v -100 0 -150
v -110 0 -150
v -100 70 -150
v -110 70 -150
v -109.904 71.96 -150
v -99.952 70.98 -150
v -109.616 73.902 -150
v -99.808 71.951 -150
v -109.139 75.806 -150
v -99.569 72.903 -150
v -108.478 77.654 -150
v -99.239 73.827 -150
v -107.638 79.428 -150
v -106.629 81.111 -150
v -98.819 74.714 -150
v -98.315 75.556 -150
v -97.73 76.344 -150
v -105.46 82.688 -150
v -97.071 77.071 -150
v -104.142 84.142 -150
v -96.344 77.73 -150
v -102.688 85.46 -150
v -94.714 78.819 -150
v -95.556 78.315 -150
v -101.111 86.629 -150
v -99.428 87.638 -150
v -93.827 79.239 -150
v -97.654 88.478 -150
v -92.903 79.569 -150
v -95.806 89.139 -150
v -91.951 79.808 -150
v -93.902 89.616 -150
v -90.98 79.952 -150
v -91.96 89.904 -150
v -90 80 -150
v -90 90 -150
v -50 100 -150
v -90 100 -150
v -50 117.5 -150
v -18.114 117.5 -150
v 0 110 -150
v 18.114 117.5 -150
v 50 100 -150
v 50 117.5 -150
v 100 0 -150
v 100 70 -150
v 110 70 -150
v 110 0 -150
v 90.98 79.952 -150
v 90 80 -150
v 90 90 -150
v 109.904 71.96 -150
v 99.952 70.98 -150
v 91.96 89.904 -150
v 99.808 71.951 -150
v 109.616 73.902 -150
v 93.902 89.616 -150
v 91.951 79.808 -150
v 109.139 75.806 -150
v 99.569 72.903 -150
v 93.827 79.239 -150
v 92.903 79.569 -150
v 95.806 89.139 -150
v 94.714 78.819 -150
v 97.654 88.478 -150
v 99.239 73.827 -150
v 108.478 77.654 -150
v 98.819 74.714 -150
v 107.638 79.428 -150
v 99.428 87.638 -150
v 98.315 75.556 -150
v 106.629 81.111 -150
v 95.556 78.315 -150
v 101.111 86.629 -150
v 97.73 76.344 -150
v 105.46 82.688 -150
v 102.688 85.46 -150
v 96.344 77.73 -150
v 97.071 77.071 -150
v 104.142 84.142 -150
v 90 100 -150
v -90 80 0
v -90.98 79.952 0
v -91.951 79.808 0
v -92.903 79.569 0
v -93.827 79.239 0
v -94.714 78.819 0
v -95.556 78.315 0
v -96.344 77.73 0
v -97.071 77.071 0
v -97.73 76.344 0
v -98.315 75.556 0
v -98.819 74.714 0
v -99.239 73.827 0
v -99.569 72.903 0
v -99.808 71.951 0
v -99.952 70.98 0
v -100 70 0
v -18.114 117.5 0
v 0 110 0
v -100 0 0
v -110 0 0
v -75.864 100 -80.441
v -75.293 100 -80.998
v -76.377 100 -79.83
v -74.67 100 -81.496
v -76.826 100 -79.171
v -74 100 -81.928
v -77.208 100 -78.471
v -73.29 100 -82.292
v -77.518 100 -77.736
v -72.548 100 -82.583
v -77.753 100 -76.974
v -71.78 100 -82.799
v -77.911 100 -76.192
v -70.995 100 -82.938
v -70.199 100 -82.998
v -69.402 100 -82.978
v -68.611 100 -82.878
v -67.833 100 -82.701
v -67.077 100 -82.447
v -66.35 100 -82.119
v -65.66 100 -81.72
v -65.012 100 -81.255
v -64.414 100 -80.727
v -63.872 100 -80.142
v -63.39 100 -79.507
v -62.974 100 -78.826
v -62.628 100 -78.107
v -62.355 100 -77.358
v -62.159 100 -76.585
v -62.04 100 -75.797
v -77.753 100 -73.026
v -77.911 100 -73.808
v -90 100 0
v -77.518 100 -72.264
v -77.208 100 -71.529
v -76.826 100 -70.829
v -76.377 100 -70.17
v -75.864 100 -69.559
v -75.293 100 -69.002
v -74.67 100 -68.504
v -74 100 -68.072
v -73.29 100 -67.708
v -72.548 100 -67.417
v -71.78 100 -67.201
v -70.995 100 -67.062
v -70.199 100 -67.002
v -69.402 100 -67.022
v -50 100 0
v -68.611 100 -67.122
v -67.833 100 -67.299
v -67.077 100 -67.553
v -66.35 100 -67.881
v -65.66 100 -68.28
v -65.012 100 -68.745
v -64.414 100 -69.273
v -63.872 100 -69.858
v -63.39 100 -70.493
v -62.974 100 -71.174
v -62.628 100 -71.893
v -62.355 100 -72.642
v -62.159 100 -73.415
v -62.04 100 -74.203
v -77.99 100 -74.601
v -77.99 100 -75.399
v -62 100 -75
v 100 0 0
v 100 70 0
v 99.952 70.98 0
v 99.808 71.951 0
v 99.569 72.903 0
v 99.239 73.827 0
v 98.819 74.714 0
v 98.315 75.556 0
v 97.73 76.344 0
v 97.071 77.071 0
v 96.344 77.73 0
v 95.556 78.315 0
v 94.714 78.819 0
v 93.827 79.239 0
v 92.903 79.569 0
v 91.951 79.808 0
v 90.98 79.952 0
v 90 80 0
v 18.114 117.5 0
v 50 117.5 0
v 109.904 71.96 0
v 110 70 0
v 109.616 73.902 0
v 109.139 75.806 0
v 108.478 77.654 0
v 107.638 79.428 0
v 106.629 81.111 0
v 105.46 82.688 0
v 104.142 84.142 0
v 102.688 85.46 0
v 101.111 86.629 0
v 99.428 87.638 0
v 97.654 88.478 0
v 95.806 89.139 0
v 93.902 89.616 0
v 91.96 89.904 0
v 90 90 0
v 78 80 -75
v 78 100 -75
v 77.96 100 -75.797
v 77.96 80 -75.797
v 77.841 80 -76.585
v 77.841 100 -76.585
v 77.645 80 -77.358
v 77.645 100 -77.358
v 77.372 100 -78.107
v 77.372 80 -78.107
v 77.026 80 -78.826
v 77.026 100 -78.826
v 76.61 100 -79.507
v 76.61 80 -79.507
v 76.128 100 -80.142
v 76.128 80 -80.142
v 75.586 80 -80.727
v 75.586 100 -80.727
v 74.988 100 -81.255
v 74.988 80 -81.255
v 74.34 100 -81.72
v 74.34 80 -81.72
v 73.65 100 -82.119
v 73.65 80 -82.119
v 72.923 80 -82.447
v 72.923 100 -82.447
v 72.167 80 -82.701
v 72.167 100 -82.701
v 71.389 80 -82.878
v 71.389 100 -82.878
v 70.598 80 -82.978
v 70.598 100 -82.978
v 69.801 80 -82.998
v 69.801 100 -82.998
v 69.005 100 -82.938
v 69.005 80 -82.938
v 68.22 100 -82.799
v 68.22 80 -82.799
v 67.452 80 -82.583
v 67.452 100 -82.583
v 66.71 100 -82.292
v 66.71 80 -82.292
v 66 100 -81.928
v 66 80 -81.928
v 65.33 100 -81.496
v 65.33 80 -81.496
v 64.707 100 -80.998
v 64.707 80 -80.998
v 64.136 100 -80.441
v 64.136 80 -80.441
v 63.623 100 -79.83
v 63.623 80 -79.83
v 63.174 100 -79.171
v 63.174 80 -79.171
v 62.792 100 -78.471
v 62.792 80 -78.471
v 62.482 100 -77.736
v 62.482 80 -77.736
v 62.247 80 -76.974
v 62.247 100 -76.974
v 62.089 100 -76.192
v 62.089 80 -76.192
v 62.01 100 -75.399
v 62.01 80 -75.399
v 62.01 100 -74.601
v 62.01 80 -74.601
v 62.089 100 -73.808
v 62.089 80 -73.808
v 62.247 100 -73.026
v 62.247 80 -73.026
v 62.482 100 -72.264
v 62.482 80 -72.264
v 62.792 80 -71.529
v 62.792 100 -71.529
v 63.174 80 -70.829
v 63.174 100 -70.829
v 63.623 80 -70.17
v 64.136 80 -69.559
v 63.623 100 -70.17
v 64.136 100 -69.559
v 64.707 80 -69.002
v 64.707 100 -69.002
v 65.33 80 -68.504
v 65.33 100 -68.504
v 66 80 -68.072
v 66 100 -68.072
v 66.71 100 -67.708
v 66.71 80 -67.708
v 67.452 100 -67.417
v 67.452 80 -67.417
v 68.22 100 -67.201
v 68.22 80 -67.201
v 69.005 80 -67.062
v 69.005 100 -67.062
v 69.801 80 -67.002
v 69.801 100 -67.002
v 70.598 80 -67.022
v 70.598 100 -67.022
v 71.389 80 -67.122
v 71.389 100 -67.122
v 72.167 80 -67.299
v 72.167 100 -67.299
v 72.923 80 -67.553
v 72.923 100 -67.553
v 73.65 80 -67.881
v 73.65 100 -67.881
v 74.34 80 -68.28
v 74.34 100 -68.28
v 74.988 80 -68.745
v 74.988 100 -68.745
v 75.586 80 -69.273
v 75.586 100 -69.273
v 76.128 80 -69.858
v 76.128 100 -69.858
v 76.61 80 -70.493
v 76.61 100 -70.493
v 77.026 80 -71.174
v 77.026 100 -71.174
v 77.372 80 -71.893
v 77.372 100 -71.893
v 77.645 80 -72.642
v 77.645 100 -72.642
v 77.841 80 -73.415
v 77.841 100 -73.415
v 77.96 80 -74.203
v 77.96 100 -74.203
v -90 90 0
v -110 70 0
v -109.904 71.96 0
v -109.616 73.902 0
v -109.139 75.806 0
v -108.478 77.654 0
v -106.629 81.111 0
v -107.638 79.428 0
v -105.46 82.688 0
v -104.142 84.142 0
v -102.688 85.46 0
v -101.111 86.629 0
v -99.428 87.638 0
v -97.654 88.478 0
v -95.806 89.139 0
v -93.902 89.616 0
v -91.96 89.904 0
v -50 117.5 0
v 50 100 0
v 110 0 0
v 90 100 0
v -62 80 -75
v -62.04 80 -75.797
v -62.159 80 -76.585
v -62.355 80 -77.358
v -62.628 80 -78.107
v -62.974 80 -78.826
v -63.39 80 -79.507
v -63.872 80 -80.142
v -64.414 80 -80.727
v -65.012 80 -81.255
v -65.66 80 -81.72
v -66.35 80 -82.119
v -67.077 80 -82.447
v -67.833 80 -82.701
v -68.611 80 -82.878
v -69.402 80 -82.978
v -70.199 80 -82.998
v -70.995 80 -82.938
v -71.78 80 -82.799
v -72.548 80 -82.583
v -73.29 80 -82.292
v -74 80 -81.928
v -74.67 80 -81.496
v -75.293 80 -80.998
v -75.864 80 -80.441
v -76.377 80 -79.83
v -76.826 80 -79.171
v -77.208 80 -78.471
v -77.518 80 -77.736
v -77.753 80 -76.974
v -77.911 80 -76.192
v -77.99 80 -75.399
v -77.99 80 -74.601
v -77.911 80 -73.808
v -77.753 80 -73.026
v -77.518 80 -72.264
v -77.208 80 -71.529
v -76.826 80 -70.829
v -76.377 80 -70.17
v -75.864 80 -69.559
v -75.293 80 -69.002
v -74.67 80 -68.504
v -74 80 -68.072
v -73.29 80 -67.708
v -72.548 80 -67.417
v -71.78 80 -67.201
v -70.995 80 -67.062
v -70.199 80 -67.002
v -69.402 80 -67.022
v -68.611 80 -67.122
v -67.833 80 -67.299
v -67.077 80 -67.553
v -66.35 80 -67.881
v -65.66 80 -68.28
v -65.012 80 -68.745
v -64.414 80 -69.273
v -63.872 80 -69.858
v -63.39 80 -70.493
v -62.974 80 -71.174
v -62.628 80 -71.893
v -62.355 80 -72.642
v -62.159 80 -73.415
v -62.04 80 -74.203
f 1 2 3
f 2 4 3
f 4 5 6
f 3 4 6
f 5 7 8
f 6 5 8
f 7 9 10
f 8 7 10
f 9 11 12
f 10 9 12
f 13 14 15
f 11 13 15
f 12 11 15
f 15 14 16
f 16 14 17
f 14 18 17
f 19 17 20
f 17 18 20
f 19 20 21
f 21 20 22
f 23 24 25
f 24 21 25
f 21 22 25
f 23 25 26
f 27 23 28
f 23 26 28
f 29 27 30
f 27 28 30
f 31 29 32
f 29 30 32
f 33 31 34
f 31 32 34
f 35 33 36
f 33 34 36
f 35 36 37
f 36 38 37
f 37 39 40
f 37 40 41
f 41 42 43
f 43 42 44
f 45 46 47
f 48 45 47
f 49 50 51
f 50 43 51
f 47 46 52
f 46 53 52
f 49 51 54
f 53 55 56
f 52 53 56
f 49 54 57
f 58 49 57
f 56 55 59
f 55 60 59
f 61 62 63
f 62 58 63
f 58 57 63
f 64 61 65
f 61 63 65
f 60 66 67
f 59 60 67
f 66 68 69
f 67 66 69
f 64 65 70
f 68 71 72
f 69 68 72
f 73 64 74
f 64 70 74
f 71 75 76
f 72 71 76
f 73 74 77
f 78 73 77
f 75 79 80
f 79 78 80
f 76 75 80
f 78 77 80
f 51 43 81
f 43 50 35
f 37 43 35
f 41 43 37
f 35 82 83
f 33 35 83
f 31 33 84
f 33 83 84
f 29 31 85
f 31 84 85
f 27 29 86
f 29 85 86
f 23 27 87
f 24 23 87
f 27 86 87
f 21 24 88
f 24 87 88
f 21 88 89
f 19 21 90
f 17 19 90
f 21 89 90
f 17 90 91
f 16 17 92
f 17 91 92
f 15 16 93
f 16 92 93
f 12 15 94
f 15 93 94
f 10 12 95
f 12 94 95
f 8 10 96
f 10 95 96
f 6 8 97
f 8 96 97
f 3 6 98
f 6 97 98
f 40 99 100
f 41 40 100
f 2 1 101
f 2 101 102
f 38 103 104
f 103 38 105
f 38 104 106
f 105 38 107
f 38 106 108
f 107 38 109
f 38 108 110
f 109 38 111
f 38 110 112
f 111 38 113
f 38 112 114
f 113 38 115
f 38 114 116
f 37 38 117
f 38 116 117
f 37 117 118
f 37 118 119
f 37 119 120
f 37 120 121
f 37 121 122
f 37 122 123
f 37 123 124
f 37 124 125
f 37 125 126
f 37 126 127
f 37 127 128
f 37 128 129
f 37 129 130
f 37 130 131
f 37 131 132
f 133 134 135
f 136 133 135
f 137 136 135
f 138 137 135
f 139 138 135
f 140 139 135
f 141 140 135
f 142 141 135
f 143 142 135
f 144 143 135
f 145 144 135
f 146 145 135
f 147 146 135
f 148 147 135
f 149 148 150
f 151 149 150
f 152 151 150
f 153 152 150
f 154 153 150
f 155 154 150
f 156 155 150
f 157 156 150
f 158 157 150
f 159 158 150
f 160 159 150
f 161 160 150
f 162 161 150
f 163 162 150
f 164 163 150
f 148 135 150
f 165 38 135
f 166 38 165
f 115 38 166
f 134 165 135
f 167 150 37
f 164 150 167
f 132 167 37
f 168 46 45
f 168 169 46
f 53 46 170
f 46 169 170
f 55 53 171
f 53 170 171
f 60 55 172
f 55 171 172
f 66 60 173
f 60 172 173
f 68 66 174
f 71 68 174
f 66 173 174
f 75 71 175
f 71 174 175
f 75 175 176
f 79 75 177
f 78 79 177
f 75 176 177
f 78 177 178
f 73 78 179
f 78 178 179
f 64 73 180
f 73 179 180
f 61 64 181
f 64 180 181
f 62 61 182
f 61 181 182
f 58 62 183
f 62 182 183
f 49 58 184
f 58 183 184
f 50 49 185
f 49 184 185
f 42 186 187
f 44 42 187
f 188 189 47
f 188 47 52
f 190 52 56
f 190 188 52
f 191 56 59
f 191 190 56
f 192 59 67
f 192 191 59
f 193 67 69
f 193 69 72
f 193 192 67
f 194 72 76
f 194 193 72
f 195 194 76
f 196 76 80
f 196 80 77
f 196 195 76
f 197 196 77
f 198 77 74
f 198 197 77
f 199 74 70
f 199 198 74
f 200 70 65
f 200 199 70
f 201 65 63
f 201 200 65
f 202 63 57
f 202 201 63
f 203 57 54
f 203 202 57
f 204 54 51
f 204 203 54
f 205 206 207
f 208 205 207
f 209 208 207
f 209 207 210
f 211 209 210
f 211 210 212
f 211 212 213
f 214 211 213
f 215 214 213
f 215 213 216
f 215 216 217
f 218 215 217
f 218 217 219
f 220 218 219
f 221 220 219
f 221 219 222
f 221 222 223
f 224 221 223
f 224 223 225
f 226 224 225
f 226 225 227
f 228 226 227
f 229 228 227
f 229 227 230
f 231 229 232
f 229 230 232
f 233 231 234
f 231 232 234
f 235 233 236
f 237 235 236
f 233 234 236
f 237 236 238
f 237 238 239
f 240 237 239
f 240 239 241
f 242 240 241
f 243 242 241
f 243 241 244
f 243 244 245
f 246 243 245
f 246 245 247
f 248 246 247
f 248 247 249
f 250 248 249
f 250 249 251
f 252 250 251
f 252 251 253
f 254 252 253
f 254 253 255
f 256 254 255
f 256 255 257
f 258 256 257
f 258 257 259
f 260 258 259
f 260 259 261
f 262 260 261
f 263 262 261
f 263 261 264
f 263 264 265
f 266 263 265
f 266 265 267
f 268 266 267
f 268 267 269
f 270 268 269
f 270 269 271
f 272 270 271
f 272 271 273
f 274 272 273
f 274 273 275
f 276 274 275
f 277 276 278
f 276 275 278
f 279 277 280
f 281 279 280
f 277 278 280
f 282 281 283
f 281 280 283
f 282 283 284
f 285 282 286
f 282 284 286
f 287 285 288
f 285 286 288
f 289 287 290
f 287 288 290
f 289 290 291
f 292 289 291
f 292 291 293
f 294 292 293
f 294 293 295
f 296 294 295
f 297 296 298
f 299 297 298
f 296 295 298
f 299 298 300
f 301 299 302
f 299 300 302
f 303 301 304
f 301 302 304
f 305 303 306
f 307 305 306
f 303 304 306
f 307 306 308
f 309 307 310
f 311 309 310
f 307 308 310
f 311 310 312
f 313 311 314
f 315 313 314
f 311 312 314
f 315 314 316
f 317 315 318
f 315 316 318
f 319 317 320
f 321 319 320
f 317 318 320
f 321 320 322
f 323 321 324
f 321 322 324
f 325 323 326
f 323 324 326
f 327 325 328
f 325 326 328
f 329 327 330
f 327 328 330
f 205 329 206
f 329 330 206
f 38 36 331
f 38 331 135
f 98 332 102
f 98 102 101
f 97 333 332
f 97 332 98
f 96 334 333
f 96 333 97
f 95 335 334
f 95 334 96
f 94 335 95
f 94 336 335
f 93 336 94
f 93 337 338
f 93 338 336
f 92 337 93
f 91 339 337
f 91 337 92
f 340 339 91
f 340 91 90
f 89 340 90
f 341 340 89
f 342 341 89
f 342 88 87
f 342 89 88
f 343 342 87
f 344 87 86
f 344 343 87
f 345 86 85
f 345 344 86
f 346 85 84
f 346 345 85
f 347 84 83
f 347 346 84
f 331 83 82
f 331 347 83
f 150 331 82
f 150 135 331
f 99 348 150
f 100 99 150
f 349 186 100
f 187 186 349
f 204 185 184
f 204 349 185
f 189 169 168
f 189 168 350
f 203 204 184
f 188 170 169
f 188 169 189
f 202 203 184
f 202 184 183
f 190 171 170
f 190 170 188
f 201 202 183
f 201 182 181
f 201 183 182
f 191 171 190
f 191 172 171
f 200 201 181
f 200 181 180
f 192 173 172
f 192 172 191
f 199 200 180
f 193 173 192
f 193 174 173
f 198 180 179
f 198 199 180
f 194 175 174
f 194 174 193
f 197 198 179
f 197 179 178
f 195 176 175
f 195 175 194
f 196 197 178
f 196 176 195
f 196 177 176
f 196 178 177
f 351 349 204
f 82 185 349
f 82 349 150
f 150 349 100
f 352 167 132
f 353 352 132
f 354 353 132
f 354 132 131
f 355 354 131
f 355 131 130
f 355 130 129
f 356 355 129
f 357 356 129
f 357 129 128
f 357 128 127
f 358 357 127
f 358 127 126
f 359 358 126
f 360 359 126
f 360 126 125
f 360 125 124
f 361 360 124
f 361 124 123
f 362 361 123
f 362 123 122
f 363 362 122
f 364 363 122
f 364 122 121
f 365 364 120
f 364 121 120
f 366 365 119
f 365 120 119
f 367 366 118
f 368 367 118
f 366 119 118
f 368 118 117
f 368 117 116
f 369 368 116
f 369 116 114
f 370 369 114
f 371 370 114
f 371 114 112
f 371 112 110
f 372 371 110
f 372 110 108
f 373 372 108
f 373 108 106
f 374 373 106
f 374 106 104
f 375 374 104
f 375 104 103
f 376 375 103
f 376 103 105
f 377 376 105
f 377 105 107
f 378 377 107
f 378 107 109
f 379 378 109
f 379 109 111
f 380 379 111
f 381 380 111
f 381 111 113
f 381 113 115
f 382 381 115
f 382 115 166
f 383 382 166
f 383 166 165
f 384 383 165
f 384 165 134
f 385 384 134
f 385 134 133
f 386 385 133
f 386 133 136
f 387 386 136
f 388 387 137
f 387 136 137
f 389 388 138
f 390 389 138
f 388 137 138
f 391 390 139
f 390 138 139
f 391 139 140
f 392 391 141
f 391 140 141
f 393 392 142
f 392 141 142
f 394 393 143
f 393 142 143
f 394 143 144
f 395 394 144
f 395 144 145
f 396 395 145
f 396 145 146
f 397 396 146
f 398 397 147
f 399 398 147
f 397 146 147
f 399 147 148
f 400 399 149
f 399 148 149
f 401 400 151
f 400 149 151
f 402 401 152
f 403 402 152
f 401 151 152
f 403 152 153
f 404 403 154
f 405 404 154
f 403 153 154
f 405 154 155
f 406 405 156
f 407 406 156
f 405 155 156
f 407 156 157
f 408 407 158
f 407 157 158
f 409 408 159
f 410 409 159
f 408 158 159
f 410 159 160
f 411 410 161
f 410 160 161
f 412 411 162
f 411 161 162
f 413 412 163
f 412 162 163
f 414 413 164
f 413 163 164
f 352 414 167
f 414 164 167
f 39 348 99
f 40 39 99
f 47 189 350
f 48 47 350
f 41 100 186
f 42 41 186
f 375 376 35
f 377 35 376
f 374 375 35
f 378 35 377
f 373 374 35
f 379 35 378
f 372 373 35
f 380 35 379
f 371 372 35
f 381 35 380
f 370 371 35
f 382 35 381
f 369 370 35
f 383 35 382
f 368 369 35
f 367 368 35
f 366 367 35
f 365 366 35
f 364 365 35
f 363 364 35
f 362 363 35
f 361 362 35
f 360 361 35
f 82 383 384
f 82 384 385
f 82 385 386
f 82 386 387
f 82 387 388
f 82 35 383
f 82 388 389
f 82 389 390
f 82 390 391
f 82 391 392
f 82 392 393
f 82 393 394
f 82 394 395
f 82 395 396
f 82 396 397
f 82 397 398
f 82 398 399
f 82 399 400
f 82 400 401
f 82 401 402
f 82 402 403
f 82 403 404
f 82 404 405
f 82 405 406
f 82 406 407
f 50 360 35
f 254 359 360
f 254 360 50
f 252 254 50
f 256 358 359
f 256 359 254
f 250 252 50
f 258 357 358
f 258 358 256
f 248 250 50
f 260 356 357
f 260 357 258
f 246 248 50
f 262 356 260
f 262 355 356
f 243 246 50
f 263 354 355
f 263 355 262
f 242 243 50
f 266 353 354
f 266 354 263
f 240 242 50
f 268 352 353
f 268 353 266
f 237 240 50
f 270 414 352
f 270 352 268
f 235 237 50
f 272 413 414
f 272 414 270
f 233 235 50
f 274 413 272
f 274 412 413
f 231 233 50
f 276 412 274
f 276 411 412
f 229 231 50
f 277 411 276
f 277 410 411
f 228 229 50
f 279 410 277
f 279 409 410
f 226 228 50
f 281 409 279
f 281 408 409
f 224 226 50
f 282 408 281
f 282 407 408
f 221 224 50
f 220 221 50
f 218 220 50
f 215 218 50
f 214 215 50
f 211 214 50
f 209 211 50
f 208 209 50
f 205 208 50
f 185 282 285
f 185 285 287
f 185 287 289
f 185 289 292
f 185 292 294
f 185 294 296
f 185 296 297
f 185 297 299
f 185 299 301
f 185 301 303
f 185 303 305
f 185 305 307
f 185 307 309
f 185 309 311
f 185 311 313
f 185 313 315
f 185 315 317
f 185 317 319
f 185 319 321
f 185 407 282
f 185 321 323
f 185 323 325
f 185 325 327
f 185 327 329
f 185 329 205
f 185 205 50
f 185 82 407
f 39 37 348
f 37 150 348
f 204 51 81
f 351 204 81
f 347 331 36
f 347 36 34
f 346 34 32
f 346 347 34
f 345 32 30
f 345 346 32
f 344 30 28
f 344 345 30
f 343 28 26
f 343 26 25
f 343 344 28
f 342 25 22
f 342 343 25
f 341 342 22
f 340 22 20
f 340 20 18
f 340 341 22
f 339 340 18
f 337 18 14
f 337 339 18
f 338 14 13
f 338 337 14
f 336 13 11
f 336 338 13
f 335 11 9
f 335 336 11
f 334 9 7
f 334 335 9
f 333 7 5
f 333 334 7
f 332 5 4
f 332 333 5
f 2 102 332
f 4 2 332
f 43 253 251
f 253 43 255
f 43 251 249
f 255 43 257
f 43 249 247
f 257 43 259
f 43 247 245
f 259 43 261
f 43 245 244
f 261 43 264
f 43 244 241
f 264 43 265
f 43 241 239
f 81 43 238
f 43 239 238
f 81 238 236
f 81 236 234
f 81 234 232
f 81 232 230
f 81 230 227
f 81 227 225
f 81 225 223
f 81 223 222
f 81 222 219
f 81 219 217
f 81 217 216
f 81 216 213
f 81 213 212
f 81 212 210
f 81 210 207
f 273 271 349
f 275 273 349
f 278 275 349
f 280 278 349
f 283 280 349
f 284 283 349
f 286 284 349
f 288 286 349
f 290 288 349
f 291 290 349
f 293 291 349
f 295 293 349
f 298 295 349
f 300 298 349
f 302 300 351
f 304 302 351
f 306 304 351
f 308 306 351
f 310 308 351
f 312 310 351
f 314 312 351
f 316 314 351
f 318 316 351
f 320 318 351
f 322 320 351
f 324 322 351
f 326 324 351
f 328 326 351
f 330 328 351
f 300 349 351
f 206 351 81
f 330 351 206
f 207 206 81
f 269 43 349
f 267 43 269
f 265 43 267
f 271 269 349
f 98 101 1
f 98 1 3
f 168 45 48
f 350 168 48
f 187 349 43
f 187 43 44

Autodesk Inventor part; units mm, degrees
ref_plane "YZ Plane" through (0, 0, 0) normal (1, 0, 0) x (0, 1, 0)
ref_plane "XZ Plane" through (0, 0, 0) normal (0, 1, 0) x (-1, 0, 0)
ref_plane "XY Plane" through (0, 0, 0) normal (0, 0, 1) x (1, 0, 0)
sketch "Sketch1" plane through (0, 0, 0) normal (0, 0, 1) x (1, 0, 0)
  line L0 (-100, 0) -> (-100, 70)
  line L1 (-90, 80) -> (90, 80)
  line L2 (100, 70) -> (100, 0)
  arc A0 (-90, 80) -> (-100, 70) centre (-90, 70) ccw
  arc A1 (100, 70) -> (90, 80) centre (90, 70) ccw
  line L3 (-110, 0) -> (-110, 70)
  arc A2 (-90, 90) -> (-110, 70) centre (-90, 70) ccw
  arc A3 (110, 70) -> (90, 90) centre (90, 70) ccw
  line L4 (110, 70) -> (110, 0)
  line L5 (100, 0) -> (110, 0)
  line L6 (-100, 0) -> (-110, 0)
  line L7 (-90, 90) -> (-90, 100)
  line L8 (90, 90) -> (90, 100)
  line L9 (-50, 100) -> (-50, 117.5)
  line L10 (50, 100) -> (50, 117.5)
  line L11 (-18.114, 117.5) -> (0, 110)
  line L12 (0, 110) -> (18.114, 117.5)
  line L13 (-50, 117.5) -> (-18.114, 117.5)
  line L14 (18.114, 117.5) -> (50, 117.5)
  line L15 (-90, 100) -> (-50, 100)
  line L16 (50, 100) -> (90, 100)
  point P0 (0, 0)
  dimension "d0" = 100
  dimension "d1" = 100
  dimension "d2" = 80
  dimension "d4" = 10
  dimension "d5" = 10
  dimension "d24" = 10
  dimension "d25" = 50
  dimension "d26" = 50
  dimension "d31" = 31.886
  dimension "d33" = 50
  dimension "d37" = 10
  dimension "d38" = 20
  dimension "d39" = 20
  dimension "d40" = 17.5
  dimension "d41" = 17.5
extrude "Extrusion1" add sketch "Sketch1" against normal blind 150
sketch "Sketch4" plane through (-90, 100, 0) normal (0, 1, 0) x (1, 0, 0)
  circle A0 centre (20, 75) radius 8
  circle A1 centre (160, 75) radius 8
  line L0 (0, 0) -> (0, 150) projected
  line L1 (40, 0) -> (0, 0) projected
  line L2 (180, 0) -> (180, 150) projected
  line L3 (180, 0) -> (140, 0) projected
  point P0 (90, 0)
  dimension "d42" = 16
  dimension "d43" = 20
  dimension "d44" = 20
  dimension "d45" = 75
  dimension "d46" = 75
extrude "Extrusion4" cut sketch "Sketch4" against normal blind 50
equation "\"d26\" = d25"
equation "\"d33\" = d25"
equation "\"d39\" = d38"
equation "\"d41\" = d40"
equation "\"d44\" = d43"
equation "\"d46\" = d45"
equation "\"d36\" = d34"
equation "\"d34\" = 75"
properties part number "Base soporte tubos"
